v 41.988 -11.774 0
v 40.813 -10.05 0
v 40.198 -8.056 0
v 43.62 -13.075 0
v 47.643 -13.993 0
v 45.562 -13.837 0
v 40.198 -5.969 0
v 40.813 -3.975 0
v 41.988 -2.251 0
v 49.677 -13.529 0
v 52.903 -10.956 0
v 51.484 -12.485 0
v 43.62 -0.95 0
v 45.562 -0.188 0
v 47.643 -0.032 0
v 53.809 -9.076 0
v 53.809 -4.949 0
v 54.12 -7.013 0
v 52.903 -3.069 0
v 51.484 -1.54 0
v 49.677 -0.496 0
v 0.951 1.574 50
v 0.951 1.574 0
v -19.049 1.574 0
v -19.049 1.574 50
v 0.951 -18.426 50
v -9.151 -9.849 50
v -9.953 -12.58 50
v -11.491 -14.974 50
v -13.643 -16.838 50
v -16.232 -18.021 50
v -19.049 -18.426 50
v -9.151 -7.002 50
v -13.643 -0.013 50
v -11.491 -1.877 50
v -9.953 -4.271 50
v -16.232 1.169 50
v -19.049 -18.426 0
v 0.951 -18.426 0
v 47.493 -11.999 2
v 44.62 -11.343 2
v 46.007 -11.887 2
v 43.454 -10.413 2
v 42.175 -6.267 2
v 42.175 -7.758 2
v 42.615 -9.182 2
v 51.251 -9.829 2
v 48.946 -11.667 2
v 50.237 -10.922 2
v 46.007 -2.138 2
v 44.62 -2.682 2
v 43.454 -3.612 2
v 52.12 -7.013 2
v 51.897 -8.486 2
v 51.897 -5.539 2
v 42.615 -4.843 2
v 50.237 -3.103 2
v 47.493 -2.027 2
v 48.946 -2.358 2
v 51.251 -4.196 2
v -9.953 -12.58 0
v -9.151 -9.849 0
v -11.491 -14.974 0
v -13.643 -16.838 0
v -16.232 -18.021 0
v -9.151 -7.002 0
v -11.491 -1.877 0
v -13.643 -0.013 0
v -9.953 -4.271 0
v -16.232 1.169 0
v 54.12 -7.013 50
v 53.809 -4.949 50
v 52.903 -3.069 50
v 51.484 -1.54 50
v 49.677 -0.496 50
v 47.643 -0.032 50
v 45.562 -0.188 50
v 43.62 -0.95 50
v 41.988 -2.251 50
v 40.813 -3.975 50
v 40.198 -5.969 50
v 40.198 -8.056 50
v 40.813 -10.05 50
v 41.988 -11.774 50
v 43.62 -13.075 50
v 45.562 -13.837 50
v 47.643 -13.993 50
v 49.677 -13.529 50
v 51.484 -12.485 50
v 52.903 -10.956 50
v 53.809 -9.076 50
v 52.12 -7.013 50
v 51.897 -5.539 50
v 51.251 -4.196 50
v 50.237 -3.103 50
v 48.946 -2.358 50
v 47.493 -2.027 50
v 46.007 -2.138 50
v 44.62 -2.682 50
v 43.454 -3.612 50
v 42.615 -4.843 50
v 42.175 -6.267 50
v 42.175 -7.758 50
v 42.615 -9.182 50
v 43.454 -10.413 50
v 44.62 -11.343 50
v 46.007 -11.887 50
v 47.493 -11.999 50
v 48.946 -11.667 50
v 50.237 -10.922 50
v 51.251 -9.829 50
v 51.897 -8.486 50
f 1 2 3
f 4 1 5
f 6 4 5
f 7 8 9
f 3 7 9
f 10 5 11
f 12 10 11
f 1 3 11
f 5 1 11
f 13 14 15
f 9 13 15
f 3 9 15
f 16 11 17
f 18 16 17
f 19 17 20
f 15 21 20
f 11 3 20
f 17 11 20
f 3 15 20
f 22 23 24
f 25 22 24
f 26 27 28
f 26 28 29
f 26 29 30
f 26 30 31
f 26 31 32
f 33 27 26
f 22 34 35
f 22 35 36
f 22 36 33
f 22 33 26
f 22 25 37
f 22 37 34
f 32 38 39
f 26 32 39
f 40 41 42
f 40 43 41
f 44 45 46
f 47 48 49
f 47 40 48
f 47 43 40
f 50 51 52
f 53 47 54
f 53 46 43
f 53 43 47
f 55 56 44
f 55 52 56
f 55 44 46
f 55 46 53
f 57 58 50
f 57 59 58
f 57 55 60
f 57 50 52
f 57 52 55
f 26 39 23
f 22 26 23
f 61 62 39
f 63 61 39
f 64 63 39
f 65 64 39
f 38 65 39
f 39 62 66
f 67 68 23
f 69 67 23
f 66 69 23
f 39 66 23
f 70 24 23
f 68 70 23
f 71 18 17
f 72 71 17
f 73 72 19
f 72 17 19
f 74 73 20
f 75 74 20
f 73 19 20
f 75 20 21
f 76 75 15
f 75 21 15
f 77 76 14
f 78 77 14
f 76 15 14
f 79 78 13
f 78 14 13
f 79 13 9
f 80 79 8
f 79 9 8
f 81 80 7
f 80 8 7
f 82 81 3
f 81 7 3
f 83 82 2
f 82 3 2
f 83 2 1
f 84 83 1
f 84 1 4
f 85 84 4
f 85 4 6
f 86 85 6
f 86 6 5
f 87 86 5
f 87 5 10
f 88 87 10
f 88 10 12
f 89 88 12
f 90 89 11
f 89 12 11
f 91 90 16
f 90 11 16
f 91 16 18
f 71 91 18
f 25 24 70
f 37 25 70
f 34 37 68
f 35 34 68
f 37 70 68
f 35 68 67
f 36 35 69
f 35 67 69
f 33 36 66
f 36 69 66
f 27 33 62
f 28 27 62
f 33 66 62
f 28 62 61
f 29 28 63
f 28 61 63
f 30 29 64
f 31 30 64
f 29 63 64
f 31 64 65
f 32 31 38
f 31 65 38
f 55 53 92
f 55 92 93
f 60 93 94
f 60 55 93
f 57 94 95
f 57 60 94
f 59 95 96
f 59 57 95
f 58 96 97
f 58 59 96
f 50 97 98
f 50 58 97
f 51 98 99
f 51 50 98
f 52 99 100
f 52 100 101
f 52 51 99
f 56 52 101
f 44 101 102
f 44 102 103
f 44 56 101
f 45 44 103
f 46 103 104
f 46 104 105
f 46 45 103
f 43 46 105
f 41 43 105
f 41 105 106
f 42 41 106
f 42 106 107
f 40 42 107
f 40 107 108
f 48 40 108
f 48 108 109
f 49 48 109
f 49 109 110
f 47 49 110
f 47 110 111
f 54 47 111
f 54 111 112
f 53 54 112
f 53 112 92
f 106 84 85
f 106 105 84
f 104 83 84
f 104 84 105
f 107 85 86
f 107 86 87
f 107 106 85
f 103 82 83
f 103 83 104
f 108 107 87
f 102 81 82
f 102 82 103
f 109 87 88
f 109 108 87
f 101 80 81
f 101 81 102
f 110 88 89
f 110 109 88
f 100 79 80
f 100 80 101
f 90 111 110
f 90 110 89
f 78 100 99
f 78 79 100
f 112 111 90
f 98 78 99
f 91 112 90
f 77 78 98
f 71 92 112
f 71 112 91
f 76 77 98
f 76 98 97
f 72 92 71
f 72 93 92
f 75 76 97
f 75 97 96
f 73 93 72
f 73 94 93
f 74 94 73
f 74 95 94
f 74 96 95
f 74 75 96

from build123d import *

# Parameters (mm, degrees)
F1_DEPTH = 50
F0_R     = 7
F2_DEPTH = 50
F3_T     = -2


with BuildPart() as f1:
    # F0 (on Top) → F1 (new body)
    with BuildSketch(Plane.XY):
        with BuildLine():
            Line((0.951087, 1.574388), (-19.048913, 1.574388))
            ThreePointArc((-19.048913, 1.574388), (-9.048913, -8.425612), (-19.048913, -18.425612))
            Line((-19.048913, -18.425612), (0.951087, -18.425612))
            Line((0.951087, -18.425612), (0.951087, 1.574388))
        make_face()
    extrude(amount=F1_DEPTH)


with BuildPart() as f2:
    # F0 (on Top) → F2 (new body)
    with BuildSketch(Plane.XY):
        with Locations((47.119565, -7.012567)):
            Circle(F0_R)
    extrude(amount=F2_DEPTH)

    # F3
    f3_openings = [f2.faces().sort_by_distance(p)[0] for p in [
        (47.119565, -7.012567, 50),
    ]]
    offset(amount=F3_T, openings=f3_openings)


solid = Compound([f1.part, f2.part])
